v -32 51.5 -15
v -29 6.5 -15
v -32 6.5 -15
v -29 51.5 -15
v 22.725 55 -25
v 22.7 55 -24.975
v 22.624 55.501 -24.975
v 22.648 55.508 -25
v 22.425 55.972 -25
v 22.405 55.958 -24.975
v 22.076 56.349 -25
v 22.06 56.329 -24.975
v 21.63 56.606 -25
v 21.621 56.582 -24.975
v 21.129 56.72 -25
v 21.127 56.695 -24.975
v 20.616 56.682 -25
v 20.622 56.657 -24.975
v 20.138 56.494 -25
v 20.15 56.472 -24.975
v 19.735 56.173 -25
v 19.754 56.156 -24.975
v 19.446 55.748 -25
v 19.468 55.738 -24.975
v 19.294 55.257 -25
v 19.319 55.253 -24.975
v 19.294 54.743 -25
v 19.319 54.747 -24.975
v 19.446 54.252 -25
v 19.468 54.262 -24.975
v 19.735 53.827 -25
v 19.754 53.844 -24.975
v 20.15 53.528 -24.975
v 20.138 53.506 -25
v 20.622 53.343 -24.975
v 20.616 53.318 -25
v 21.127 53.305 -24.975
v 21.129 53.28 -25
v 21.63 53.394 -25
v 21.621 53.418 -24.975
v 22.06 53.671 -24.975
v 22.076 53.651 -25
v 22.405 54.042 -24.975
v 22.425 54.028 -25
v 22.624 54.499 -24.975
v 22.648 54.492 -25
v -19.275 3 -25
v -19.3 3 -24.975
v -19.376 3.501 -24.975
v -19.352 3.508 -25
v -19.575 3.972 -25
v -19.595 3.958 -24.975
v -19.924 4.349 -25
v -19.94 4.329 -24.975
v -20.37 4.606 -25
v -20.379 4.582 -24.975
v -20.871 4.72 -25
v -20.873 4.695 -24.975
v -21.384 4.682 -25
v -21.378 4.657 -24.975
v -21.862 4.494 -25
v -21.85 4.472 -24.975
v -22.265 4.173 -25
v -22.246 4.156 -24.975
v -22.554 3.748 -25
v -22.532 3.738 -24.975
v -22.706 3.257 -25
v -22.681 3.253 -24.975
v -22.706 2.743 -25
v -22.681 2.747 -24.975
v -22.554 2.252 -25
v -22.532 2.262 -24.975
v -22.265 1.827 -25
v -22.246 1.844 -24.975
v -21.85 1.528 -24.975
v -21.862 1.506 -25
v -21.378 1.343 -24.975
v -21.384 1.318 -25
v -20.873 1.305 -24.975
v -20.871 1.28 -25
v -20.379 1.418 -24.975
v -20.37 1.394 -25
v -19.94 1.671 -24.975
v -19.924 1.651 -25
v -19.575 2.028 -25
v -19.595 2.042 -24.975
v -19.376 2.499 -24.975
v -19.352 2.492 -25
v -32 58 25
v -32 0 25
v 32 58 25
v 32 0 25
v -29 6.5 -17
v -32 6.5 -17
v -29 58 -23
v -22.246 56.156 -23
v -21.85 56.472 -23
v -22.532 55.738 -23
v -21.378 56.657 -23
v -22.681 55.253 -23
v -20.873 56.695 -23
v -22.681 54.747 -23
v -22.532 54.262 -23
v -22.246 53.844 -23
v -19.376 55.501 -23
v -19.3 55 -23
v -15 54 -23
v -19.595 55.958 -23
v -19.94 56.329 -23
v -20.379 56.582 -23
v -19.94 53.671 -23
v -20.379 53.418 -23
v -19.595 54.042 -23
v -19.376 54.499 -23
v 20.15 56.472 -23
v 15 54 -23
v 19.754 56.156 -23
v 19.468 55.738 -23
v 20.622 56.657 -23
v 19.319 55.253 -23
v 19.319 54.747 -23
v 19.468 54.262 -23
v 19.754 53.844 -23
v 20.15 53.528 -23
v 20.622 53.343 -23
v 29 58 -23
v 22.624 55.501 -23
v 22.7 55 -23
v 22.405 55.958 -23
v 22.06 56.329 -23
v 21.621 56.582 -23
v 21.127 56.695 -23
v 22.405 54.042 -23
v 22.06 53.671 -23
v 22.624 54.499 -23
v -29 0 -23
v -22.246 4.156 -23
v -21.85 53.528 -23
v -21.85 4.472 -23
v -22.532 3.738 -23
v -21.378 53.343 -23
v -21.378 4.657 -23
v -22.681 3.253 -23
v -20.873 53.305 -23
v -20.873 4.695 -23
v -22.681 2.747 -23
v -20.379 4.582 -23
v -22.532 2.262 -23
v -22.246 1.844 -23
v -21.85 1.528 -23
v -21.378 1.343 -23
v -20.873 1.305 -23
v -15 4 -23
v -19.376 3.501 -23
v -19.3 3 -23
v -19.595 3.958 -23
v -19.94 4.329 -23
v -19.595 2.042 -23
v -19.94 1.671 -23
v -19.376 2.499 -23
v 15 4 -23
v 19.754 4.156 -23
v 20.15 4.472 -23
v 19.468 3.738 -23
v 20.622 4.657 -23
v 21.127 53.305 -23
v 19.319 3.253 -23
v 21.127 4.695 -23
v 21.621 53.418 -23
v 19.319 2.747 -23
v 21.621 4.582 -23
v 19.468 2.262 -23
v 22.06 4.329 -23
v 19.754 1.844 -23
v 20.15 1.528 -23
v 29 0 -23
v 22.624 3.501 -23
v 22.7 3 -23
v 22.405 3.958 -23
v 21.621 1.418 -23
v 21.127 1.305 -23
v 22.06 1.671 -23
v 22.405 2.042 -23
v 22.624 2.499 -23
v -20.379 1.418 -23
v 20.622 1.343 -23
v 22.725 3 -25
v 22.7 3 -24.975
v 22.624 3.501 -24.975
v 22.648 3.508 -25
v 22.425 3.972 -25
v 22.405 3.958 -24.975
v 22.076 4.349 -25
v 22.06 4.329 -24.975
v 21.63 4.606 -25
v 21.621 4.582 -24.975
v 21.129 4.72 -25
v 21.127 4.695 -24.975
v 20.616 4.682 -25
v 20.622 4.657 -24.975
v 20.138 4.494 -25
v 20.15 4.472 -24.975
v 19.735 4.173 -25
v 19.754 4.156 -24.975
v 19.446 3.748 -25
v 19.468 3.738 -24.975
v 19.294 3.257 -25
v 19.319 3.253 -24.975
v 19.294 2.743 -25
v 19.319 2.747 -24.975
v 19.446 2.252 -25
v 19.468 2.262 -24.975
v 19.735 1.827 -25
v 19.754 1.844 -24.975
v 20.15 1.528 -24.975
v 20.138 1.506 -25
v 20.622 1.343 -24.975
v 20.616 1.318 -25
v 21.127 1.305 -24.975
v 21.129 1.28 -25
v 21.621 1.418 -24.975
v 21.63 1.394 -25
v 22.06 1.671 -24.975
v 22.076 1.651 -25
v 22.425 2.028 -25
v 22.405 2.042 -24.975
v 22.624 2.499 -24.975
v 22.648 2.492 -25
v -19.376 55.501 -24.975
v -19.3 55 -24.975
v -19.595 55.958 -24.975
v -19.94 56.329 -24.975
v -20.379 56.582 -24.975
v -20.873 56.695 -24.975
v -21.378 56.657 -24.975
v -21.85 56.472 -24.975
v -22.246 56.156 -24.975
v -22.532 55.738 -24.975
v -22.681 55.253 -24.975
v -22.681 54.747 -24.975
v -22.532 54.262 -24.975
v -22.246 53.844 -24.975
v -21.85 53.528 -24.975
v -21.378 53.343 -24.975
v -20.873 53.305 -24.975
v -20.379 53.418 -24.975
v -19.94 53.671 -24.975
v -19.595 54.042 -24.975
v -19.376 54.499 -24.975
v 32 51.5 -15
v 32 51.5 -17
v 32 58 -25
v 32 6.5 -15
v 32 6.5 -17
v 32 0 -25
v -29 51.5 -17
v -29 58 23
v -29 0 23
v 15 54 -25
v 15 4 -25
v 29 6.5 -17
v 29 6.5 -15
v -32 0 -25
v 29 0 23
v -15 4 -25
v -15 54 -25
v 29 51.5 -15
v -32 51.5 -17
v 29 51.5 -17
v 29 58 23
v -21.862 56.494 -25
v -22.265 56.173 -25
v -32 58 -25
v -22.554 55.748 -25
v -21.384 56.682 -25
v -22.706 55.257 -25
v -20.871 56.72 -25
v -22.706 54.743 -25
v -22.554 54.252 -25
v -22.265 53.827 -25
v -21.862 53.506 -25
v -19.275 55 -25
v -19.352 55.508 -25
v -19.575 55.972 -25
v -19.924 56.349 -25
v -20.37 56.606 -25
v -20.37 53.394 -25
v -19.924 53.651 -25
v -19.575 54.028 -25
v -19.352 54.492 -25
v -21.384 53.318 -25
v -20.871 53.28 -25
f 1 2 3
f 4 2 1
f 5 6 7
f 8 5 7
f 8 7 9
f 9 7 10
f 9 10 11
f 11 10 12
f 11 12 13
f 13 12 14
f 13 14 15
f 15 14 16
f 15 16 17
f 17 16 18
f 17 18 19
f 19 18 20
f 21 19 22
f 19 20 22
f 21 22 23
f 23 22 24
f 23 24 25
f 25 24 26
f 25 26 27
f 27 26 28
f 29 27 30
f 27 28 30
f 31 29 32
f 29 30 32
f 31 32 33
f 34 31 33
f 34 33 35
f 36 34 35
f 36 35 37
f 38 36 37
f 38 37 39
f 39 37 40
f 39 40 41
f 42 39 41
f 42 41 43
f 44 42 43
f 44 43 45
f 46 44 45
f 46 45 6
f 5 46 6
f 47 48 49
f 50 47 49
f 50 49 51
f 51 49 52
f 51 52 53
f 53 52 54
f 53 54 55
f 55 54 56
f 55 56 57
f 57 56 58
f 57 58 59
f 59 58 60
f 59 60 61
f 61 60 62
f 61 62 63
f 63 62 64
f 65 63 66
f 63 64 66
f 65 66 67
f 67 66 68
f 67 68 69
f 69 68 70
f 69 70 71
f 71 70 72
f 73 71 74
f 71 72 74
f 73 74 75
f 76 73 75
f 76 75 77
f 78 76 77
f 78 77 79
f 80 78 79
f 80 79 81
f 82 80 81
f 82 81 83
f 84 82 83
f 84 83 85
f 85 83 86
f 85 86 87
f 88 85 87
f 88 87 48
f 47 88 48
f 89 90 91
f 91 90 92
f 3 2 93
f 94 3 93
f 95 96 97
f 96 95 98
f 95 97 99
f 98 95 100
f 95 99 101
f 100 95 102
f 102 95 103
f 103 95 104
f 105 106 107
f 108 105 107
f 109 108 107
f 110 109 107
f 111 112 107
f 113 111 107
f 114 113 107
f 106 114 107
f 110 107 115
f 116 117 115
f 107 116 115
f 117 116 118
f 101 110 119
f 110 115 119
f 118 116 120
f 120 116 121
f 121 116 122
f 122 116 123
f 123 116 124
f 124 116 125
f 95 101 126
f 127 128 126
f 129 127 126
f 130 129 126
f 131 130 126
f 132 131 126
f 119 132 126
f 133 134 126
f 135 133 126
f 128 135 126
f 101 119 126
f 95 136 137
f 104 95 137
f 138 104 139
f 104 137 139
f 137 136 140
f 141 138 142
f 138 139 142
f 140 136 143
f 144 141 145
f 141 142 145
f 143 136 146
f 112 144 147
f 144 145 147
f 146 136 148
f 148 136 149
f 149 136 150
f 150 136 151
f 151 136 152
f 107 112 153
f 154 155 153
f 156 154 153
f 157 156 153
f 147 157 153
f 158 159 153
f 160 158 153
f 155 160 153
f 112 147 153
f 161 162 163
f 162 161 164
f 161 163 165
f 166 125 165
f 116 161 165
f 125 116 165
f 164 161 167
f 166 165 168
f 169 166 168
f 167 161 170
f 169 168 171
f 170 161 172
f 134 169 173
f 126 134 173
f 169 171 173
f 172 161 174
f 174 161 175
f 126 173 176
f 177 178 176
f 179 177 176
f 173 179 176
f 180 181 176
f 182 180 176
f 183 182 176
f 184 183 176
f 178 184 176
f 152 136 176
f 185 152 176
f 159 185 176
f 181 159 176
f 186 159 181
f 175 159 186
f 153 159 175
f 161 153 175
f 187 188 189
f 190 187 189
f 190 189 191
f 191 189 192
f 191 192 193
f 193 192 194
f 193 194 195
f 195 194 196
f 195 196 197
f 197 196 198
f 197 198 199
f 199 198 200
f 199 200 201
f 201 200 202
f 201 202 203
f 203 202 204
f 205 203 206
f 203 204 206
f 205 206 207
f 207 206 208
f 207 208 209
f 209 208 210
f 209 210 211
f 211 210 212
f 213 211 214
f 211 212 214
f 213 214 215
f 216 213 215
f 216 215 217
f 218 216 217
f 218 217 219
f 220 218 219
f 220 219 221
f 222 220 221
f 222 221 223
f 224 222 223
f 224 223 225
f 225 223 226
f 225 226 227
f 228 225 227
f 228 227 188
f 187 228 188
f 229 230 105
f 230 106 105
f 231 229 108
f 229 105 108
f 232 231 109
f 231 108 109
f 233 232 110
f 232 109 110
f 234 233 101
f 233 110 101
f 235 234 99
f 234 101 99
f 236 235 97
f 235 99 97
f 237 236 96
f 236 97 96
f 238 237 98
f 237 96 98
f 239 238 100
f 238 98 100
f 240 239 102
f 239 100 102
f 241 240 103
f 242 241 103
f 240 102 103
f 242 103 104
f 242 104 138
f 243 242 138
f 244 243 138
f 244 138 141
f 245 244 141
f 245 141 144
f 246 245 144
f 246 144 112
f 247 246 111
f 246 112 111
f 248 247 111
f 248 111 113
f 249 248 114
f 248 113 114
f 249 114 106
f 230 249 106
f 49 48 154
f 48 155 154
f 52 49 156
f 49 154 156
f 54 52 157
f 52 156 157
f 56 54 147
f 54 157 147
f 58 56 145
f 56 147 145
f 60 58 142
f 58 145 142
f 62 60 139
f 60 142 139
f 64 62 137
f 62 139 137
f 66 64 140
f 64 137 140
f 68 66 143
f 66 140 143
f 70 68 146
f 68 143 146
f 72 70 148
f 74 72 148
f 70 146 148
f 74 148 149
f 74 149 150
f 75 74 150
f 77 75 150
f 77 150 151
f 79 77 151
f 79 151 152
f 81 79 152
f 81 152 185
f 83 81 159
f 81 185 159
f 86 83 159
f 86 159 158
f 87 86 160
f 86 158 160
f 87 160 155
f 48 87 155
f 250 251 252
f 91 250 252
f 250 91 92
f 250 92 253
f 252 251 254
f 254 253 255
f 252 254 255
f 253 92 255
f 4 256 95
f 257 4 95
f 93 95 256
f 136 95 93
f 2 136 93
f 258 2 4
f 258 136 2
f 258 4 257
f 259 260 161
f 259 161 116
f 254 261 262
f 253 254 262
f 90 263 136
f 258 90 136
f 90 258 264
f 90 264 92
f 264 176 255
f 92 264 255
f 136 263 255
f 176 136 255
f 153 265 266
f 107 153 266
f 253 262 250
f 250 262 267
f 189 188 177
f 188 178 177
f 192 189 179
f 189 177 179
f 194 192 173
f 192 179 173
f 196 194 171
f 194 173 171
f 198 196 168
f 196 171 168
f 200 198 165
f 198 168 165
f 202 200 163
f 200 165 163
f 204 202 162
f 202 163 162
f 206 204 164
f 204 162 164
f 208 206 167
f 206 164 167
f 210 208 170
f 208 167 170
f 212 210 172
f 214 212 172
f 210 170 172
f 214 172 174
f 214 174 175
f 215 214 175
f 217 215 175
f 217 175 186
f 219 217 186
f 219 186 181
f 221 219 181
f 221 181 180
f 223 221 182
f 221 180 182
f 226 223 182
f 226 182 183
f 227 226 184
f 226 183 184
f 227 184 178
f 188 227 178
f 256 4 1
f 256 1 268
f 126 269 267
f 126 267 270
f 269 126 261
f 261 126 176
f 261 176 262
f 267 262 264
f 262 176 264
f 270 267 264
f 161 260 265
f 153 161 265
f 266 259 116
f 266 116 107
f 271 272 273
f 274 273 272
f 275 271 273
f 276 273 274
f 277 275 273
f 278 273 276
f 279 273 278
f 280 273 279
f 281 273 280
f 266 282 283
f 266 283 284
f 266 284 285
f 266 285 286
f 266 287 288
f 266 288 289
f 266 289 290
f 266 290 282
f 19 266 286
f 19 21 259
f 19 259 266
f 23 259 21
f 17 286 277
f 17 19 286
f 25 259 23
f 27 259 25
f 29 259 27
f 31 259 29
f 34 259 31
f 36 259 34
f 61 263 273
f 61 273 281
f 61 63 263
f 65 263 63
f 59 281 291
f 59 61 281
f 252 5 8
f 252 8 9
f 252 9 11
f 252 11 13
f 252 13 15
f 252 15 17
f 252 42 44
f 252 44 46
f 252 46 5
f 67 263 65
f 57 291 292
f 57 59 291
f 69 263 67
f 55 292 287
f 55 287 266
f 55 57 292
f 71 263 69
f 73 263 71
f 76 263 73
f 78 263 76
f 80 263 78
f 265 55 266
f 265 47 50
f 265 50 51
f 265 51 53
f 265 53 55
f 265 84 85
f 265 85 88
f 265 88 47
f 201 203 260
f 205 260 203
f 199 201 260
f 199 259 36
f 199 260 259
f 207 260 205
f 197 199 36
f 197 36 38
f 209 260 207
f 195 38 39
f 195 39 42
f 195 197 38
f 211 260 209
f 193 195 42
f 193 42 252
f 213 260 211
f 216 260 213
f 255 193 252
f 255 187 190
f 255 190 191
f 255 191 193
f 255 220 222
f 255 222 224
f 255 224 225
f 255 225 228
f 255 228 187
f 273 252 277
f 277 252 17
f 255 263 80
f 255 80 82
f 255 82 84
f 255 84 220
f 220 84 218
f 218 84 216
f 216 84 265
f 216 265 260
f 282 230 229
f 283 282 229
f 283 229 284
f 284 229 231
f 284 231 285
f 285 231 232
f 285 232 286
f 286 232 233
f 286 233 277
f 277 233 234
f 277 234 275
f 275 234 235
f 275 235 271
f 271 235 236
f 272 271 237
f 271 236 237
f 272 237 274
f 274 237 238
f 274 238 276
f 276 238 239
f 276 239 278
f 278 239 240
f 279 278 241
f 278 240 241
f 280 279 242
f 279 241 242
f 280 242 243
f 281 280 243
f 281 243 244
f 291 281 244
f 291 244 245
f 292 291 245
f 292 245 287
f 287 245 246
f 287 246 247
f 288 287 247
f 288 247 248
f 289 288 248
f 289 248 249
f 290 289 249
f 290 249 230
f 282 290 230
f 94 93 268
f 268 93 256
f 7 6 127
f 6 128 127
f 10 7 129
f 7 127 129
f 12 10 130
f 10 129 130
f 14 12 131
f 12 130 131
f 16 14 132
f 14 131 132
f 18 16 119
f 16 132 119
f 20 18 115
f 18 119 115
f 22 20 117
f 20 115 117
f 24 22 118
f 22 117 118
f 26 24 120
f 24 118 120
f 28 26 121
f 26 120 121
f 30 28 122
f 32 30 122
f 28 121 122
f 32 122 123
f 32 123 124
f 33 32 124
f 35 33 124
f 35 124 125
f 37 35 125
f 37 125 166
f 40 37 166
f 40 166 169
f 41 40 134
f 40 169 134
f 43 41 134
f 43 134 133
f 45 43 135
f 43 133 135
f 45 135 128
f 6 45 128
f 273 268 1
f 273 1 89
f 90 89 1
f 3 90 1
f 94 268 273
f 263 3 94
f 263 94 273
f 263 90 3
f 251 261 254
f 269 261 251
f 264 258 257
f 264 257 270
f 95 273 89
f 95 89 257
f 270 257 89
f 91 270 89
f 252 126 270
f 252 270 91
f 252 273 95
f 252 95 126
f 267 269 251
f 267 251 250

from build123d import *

# Parameters (mm, degrees)
SKETCH_1_W                   = 64
SKETCH_1_H                   = 50
EXTRUDE_2_DEPTH              = 58
SKETCH_2_W                   = 58
SKETCH_2_H                   = 46
CUT_EXTRUDE_1_DEPTH          = 71.802542327
SKETCH_5_W                   = 2
SKETCH_5_H                   = 45
CUT_EXTRUDE_2_DEPTH          = 50
SKETCH_6_W                   = 2
SKETCH_6_H                   = 45
CUT_EXTRUDE_3_DEPTH          = 50
HOLE_WIZARD_M3_1_D           = 3.4
HOLE_WIZARD_M3_1_DEPTH       = 5
HOLE_WIZARD_M3_1_CSINK_D     = 3.45
HOLE_WIZARD_M3_1_CSINK_ANGLE = 90
HOLE_WIZARD_M3_1_TIP         = 1.021463052
SKETCH_9_W                   = 30
SKETCH_9_H                   = 50
CUT_EXTRUDE_4_DEPTH          = 30


with BuildPart() as part:
    # 草图1 → 凸台-拉伸2 (new body)
    with BuildSketch(Plane(origin=(0, 0, 0), x_dir=(1, 0, 0), z_dir=(0, 1, 0))):
        Rectangle(SKETCH_1_W, SKETCH_1_H)
    extrude(amount=EXTRUDE_2_DEPTH)

    # 草图2 → 切除-拉伸1 (cut, through all)
    with BuildSketch(Plane.XZ):
        Rectangle(SKETCH_2_W, SKETCH_2_H)
    extrude(amount=-CUT_EXTRUDE_1_DEPTH, mode=Mode.SUBTRACT)

    # 草图5 → 切除-拉伸2 (cut)
    with BuildSketch(Plane.ZY.offset(-29)):
        with Locations((-16, 29)):
            Rectangle(SKETCH_5_W, SKETCH_5_H)
    extrude(amount=-CUT_EXTRUDE_2_DEPTH, mode=Mode.SUBTRACT)

    # 草图6 → 切除-拉伸3 (cut)
    with BuildSketch(Plane(origin=(-29, 0, 0), x_dir=(0, 0, -1), z_dir=(1, 0, 0))):
        with Locations((16, 29)):
            Rectangle(SKETCH_6_W, SKETCH_6_H)
    extrude(amount=-CUT_EXTRUDE_3_DEPTH, mode=Mode.SUBTRACT)

    # M3 间隙孔1
    with Locations(Plane(origin=(0, 0, -25), x_dir=(-1, 0, 0), z_dir=(0, 0, -1))):
        with Locations((-21, 55), (-21, 3), (21, 3), (21, 55)):
            CounterSinkHole(HOLE_WIZARD_M3_1_D / 2, HOLE_WIZARD_M3_1_CSINK_D / 2, depth=HOLE_WIZARD_M3_1_DEPTH, counter_sink_angle=HOLE_WIZARD_M3_1_CSINK_ANGLE)
            with Locations((0, 0, -(HOLE_WIZARD_M3_1_DEPTH + HOLE_WIZARD_M3_1_TIP / 2))):  # 118° drill point
                Cone(0, HOLE_WIZARD_M3_1_D / 2, HOLE_WIZARD_M3_1_TIP, mode=Mode.SUBTRACT)

    # 草图9 → 切除-拉伸4 (cut)
    with BuildSketch(Plane(origin=(0, 0, -25), x_dir=(-1, 0, 0), z_dir=(0, 0, -1))):
        with Locations((0, 29)):
            Rectangle(SKETCH_9_W, SKETCH_9_H)
    extrude(amount=-CUT_EXTRUDE_4_DEPTH, mode=Mode.SUBTRACT)


solid = part.part
